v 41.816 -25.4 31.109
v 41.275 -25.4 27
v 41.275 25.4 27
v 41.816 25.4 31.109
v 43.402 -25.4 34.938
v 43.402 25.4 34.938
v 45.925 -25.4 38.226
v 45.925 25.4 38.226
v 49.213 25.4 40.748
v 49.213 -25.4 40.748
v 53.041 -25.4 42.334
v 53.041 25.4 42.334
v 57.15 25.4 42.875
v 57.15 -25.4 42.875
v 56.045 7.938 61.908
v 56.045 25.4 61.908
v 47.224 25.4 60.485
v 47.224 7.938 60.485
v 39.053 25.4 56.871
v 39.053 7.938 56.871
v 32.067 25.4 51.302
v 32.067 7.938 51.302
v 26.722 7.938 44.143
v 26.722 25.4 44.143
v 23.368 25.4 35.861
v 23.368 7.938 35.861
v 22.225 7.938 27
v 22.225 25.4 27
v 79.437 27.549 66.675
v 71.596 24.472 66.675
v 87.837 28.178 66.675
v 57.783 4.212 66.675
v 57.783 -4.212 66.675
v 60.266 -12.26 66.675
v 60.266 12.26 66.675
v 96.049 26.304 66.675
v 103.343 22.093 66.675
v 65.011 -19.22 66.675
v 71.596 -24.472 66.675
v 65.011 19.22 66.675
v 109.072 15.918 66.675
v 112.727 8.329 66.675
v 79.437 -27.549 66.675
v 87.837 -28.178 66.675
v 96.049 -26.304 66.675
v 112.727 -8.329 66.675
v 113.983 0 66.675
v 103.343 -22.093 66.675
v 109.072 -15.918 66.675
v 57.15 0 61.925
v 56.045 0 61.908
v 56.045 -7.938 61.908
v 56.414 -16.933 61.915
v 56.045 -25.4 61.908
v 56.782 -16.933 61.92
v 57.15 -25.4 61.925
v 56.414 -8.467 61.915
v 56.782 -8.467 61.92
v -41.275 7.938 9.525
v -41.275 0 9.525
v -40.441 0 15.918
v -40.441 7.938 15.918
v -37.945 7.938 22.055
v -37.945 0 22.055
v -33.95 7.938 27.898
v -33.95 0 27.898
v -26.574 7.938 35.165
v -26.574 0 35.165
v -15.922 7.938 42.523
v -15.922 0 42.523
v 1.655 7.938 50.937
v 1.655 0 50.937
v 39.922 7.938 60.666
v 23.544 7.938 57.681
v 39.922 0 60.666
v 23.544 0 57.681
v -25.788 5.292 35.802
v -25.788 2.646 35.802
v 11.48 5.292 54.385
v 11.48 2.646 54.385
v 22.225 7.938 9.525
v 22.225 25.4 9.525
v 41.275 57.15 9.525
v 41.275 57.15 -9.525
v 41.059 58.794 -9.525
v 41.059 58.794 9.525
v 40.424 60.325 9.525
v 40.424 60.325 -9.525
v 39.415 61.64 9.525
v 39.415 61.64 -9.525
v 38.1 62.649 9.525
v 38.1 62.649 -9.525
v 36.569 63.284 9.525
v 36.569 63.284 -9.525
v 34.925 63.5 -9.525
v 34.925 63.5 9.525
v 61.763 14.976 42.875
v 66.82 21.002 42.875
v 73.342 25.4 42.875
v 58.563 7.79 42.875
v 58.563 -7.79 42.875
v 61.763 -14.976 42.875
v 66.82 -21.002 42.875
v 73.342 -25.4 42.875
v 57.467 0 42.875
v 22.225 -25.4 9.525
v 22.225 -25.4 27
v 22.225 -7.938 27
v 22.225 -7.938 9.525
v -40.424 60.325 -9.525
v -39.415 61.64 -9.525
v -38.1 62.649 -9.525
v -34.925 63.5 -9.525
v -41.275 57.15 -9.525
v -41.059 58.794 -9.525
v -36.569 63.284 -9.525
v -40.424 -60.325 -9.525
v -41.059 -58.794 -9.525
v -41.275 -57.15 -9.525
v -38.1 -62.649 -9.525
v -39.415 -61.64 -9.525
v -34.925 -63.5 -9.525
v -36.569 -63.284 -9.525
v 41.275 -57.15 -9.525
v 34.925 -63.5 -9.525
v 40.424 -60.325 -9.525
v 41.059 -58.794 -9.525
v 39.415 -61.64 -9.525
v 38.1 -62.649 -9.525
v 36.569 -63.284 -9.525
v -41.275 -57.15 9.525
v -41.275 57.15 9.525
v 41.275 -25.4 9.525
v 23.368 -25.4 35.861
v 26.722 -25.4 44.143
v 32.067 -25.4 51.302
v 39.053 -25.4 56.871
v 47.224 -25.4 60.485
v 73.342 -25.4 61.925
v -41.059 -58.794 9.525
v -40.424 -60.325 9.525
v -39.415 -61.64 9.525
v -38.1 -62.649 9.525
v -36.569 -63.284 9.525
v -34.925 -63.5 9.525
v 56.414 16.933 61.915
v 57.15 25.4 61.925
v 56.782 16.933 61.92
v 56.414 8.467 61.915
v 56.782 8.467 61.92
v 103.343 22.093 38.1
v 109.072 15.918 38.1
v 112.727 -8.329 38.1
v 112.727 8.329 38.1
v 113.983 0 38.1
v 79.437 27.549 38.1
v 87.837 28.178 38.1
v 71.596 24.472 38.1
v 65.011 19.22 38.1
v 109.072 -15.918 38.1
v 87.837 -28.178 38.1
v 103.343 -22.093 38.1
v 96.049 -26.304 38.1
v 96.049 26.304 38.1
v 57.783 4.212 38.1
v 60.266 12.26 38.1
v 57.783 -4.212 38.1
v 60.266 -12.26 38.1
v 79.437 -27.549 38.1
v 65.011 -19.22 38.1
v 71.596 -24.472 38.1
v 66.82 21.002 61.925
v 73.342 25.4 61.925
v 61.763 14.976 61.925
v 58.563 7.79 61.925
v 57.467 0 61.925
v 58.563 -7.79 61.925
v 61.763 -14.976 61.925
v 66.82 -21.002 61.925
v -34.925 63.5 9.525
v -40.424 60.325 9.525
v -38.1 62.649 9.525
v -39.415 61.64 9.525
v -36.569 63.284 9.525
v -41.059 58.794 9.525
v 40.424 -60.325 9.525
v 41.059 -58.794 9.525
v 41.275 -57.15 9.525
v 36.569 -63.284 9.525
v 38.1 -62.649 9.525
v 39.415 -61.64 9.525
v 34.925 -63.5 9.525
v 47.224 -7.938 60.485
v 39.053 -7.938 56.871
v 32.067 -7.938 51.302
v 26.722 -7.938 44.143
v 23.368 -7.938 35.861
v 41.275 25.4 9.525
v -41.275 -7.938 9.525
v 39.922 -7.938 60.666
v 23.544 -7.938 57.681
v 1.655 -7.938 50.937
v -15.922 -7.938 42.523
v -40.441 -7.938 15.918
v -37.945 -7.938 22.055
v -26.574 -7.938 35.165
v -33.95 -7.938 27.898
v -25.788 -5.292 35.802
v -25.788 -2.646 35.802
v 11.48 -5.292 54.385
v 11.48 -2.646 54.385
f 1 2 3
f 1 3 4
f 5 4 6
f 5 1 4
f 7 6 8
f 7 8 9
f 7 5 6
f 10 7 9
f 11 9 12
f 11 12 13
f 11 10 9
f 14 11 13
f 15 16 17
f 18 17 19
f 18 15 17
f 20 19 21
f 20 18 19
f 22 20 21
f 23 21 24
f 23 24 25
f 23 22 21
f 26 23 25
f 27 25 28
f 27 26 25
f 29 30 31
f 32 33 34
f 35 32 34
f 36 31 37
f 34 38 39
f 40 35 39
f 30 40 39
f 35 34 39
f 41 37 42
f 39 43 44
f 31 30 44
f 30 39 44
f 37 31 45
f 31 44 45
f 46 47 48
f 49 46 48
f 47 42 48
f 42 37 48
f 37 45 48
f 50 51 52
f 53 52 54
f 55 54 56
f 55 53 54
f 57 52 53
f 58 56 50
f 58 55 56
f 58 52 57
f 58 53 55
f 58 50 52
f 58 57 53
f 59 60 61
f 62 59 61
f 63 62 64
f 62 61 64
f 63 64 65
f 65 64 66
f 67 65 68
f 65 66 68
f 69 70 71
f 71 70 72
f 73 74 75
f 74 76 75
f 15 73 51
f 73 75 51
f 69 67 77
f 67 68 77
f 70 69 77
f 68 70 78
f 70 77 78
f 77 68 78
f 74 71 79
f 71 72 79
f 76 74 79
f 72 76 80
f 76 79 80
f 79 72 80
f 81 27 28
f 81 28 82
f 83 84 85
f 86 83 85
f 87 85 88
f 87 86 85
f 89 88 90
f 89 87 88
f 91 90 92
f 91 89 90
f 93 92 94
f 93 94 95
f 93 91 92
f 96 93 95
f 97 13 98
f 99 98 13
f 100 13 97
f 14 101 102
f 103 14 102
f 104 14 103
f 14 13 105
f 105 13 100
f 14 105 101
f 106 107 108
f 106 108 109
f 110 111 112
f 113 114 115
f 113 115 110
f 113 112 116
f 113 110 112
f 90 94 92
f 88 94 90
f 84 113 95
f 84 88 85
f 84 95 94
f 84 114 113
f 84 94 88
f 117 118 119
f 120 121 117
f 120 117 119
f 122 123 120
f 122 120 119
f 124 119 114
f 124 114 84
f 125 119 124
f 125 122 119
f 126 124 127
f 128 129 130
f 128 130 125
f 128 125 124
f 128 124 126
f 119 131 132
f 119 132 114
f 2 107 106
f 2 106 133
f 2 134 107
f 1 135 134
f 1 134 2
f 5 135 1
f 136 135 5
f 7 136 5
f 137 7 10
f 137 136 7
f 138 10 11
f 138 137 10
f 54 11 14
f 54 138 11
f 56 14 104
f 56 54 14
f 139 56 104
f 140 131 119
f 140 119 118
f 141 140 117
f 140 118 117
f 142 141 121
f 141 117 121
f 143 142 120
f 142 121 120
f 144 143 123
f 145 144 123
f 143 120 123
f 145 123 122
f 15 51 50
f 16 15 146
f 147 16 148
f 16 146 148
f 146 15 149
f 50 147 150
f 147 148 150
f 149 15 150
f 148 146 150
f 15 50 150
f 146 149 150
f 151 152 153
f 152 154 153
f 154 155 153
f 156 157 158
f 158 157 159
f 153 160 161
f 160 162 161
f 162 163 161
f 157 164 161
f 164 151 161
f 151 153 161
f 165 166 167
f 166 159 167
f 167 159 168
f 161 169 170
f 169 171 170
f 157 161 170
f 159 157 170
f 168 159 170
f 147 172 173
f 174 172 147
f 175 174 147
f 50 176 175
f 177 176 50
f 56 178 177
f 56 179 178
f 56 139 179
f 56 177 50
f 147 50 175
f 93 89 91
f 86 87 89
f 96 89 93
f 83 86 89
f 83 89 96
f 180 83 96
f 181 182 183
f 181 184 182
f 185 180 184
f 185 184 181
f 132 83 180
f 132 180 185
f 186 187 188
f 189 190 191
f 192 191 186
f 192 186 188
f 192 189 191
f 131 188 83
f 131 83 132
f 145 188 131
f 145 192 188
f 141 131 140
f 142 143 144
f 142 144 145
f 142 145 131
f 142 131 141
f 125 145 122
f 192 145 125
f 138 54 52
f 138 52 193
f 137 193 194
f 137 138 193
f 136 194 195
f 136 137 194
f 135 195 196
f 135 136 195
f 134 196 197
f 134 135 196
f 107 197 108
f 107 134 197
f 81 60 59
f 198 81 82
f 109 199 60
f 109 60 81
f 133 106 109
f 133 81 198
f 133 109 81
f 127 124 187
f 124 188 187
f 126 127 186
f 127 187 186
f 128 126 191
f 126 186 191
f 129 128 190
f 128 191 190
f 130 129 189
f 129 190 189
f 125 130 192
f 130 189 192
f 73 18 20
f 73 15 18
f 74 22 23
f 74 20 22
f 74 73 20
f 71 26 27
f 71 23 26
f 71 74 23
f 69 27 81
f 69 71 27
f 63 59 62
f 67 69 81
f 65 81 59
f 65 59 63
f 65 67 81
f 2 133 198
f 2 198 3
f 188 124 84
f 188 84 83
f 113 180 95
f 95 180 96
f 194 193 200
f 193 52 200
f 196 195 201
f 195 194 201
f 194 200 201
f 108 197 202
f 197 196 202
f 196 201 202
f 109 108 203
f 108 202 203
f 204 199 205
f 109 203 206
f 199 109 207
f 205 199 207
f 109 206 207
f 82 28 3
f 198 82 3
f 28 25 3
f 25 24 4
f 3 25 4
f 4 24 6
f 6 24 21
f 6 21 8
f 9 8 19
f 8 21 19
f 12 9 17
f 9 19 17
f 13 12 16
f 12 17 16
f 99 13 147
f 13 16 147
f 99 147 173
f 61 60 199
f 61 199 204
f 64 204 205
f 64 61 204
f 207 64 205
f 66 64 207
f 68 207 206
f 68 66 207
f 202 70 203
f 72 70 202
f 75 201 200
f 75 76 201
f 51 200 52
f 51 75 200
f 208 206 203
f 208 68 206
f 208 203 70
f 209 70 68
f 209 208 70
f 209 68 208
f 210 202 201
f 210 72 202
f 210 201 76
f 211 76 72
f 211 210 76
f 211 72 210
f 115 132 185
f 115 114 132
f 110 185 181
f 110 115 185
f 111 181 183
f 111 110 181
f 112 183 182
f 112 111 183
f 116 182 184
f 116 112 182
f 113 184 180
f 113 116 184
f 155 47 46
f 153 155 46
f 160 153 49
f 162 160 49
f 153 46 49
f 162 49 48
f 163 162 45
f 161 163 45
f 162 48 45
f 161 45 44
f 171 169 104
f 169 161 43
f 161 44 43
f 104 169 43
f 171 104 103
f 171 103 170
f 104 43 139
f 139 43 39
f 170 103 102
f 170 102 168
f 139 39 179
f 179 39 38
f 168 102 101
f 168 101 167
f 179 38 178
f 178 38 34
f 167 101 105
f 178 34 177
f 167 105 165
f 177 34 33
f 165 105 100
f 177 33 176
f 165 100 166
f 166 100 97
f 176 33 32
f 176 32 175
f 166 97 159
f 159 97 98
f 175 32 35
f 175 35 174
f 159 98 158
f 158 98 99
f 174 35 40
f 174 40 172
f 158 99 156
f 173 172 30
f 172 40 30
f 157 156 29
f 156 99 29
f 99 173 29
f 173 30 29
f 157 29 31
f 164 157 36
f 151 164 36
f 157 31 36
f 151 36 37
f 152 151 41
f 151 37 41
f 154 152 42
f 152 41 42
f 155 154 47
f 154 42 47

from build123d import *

# Parameters (mm, degrees)
F1_DEPTH = 63.5
F0_W     = 22.5424882722
F0_H     = 19.05
F2_DEPTH = 25.4
F3_DEPTH = 7.9375
F5_R     = 6.35


with BuildPart() as f1:
    # F0 (on Front) → F1 (new body, symmetric)
    with BuildSketch(Plane.XZ):
        Polygon((-41.275, 9.525), (-41.275, -9.525), (41.275, -9.525), (41.275, 9.525), (22.225, 9.525), align=None)
    extrude(amount=F1_DEPTH, both=True)

    # F5
    f5_edges = [f1.edges().sort_by_distance(p)[0] for p in [
        (41.275, -63.5, 0),
        (-41.275, -63.5, 0),
        (41.275, 63.5, 0),
        (-41.275, 63.5, 0),
    ]]
    fillet(f5_edges, radius=F5_R)


with BuildPart() as f2:
    # F0 (on Front) → F2 (new body, symmetric)
    with BuildSketch(Plane.XZ):
        with BuildLine():
            Line((22.225, 9.525), (41.275, 9.525))
            Line((41.275, 9.525), (41.275, 27.0002))
            ThreePointArc((41.275, 27.0002), (45.9246798487, 38.2255201513), (57.15, 42.8752))
            Line((57.15, 42.8752), (63.1825117278, 42.8752))
            Line((63.1825117278, 42.8752), (63.1825117278, 61.9252))
            Line((63.1825117278, 61.9252), (57.15, 61.9252))
            add(Edge.make_bspline(
                [(56.0449542067, 61.9077135006), (56.4140967853, 61.9151121698), (56.7824587666, 61.9209441136), (57.15, 61.9252)],
                knots=[110.563800657, 110.563800657, 110.563800657, 110.563800657, 111.5045361635, 111.5045361635, 111.5045361635, 111.5045361635], degree=3))
            ThreePointArc((56.0449542067, 61.9077135006), (32.0666454663, 51.302071334), (22.225, 27.0002))
            Line((22.225, 27.0002), (22.225, 9.525))
        make_face()
        with Locations((74.4537558639, 52.4002)):
            Rectangle(F0_W, F0_H)
    extrude(amount=F2_DEPTH, both=True)

    # F0 (on Front) → F3 (join, symmetric)
    with BuildSketch(Plane.XZ):
        with BuildLine():
            add(Edge.make_bspline(
                [(-41.275, 9.525), (-41.5074973481, 38.5272765574), (12.65995791, 61.0381545449), (56.0449542067, 61.9077135006)],
                knots=[0, 0, 0, 0, 110.563800657, 110.563800657, 110.563800657, 110.563800657], degree=3))
            Line((-41.275, 9.525), (22.225, 9.525))
            Line((22.225, 9.525), (22.225, 27.0002))
            ThreePointArc((22.225, 27.0002), (32.0666454663, 51.302071334), (56.0449542067, 61.9077135006))
        make_face()
    extrude(amount=F3_DEPTH, both=True)

    # F0 (on Front) → F4 (revolve)
    with BuildSketch(Plane.XZ):
        Polygon((85.725, 66.675), (85.725, 61.9252), (85.725, 42.8752), (85.725, 38.1), (113.9825117278, 38.1), (113.9825117278, 66.675), align=None)
    revolve(axis=Axis((85.725, 0, 52.3875), (0, 0, -1)))


solid = Compound([f1.part, f2.part])
